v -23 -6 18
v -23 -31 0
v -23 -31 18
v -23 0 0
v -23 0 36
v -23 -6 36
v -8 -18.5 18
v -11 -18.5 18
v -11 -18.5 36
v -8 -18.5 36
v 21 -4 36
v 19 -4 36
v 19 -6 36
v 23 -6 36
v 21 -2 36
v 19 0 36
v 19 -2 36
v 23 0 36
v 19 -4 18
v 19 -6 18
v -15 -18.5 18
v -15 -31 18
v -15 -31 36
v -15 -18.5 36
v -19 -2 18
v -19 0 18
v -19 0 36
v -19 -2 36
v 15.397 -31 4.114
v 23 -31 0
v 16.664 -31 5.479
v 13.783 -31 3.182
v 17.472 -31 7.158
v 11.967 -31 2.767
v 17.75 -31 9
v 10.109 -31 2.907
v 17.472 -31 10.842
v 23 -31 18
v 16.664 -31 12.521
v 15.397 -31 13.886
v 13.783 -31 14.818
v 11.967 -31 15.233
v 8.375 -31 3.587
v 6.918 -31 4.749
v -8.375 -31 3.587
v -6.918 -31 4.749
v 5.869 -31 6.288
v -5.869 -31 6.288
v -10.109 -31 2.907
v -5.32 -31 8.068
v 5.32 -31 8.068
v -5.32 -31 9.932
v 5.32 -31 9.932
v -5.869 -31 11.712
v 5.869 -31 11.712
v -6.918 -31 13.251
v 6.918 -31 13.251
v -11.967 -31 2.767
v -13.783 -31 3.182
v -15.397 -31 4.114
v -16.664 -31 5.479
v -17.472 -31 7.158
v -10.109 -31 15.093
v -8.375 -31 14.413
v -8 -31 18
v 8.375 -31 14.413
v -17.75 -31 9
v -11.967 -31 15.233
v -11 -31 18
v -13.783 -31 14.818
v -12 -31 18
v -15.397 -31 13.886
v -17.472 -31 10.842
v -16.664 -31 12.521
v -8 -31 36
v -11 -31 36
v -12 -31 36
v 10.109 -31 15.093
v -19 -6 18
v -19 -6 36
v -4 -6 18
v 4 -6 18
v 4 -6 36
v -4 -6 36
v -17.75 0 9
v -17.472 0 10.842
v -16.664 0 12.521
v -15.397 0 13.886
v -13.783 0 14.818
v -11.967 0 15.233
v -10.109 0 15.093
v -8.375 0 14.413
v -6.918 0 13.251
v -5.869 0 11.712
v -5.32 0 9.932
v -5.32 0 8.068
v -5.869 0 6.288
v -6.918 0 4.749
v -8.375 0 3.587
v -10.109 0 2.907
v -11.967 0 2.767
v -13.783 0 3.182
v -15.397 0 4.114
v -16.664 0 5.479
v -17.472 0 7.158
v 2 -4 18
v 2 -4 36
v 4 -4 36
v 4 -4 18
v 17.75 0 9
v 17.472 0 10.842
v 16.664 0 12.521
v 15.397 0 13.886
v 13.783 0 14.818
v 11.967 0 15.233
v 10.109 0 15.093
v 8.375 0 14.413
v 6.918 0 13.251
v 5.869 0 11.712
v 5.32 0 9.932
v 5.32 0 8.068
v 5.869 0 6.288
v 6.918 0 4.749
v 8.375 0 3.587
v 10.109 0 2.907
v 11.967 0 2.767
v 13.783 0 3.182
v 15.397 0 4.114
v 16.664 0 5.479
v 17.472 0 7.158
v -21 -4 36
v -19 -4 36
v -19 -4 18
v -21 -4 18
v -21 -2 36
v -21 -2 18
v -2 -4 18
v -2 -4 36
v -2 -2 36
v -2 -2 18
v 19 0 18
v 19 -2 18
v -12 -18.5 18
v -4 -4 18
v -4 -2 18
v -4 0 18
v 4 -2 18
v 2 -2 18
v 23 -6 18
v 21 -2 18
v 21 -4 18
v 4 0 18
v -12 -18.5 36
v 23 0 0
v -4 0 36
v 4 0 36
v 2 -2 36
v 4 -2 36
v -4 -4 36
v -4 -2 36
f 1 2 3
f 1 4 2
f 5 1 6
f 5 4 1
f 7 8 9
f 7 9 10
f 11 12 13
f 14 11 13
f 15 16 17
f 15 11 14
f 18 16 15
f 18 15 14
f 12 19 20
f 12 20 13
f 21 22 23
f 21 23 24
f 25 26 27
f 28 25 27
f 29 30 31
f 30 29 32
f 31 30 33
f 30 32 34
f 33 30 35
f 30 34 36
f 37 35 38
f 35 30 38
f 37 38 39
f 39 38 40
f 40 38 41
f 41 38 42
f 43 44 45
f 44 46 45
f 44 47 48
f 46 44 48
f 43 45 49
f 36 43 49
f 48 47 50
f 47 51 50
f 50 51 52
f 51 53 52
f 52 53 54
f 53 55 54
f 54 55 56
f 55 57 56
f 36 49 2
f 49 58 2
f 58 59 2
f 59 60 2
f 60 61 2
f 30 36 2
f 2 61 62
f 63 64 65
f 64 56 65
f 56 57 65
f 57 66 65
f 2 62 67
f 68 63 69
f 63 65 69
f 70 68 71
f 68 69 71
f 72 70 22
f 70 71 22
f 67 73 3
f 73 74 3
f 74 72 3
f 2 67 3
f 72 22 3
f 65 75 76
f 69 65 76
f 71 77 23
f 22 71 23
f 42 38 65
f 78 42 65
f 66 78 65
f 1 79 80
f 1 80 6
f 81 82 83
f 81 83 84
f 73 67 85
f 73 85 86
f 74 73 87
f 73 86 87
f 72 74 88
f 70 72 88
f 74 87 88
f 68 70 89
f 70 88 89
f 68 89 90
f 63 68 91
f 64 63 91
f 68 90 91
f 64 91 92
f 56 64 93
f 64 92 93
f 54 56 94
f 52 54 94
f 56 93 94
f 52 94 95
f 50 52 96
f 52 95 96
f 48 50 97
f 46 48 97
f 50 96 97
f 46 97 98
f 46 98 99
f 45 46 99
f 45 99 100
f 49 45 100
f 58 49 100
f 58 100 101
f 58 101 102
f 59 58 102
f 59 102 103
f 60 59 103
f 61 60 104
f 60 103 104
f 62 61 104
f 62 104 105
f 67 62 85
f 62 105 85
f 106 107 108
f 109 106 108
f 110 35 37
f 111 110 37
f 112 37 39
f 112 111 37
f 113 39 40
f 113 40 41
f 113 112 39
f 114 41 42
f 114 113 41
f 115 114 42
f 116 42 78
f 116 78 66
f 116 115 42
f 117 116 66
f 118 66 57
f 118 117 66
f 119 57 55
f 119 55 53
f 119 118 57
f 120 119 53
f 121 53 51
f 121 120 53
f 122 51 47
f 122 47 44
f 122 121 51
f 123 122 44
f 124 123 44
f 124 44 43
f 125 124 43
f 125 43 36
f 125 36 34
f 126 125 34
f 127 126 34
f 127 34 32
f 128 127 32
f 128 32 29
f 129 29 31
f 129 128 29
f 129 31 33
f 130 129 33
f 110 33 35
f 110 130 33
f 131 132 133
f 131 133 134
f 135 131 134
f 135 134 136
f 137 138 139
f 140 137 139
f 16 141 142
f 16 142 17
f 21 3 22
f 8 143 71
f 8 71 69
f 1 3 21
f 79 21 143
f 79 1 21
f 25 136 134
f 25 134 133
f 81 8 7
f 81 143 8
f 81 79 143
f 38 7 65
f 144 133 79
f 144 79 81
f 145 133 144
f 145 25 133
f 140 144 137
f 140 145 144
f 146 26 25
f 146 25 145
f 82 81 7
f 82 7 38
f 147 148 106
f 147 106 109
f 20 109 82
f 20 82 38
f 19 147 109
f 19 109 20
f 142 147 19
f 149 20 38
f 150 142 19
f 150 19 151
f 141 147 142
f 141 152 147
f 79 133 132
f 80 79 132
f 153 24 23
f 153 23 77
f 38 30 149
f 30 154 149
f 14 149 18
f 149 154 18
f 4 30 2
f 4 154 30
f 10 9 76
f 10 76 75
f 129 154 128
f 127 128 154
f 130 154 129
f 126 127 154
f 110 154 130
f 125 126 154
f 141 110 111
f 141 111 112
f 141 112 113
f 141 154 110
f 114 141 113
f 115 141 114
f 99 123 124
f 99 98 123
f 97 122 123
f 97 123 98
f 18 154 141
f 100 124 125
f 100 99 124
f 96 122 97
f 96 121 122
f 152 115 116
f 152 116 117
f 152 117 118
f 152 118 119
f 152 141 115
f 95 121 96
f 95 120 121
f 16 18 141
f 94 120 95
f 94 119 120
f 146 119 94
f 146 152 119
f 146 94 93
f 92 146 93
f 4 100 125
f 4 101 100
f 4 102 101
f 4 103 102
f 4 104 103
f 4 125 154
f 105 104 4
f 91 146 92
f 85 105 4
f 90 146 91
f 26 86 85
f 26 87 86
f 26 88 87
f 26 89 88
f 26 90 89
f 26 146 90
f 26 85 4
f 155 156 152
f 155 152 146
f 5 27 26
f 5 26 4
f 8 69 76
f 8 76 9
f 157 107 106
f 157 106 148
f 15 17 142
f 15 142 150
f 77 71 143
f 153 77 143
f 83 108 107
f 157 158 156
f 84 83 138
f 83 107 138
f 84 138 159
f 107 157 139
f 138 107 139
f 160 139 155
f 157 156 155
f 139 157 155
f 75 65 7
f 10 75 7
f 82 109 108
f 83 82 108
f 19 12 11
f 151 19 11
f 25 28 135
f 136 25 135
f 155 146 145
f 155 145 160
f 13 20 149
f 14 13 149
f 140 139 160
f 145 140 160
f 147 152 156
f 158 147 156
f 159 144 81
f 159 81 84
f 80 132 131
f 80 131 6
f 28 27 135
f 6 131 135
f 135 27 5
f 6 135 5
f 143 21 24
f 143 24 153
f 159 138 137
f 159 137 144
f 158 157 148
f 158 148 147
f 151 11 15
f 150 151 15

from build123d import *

# Parameters (mm, degrees)
F0_R     = 6.25
F0_W     = 4
F0_H     = 18
F1_DEPTH = 6
F3_W     = 2
F3_H     = 2
F2_W     = 2
F2_H     = 2
F4_DEPTH = 18
F5_R     = 6.25
F6_DEPTH = 25
F8_W     = 3
F8_H     = 12.5
F9_DEPTH = 18


with BuildPart() as f1:
    # F0 (on Front) → F1 (new body)
    with BuildSketch(Plane.XZ):
        Polygon((0, 18), (0, 0), (23, 0), (23, 18), (19, 18), (4, 18), align=None)
        with Locations((11.5, 9)):
            Circle(F0_R, mode=Mode.SUBTRACT)
        with Locations((2, 27)):
            Rectangle(F0_W, F0_H)
        with Locations((21, 27)):
            Rectangle(F0_W, F0_H)
    extrude(amount=F1_DEPTH)

    # F3 (on face) + F2 (on face) → F4 (cut)
    with BuildSketch(Plane.XY.offset(36)):
        with Locations((20, -3)):
            Rectangle(F3_W, F3_H)
    with BuildSketch(Plane.XY.offset(36)):
        with Locations((3, -3)):
            Rectangle(F2_W, F2_H)
    extrude(amount=-F4_DEPTH, mode=Mode.SUBTRACT)

    # F5 (on face) → F6 (join)
    with BuildSketch(Plane.XZ.offset(6)):
        Polygon((19, 18), (4, 18), (0, 18), (0, 0), (23, 0), (23, 18), align=None)
        with Locations((11.5, 9)):
            Circle(F5_R, mode=Mode.SUBTRACT)
    extrude(amount=F6_DEPTH)

    # F7: F1 across plane


with BuildPart() as f1_1:
    add(f1.part)
    add(f1.part.mirror(Plane.YZ))

    # F8 (on face) → F9 (join)
    with BuildSketch(Plane.XY.offset(18)):
        with Locations((-13.5, -24.75)):
            Rectangle(F8_W, F8_H)
        with Locations((-9.5, -24.75)):
            Rectangle(F8_W, F8_H)
    extrude(amount=F9_DEPTH)


solid = f1_1.part
